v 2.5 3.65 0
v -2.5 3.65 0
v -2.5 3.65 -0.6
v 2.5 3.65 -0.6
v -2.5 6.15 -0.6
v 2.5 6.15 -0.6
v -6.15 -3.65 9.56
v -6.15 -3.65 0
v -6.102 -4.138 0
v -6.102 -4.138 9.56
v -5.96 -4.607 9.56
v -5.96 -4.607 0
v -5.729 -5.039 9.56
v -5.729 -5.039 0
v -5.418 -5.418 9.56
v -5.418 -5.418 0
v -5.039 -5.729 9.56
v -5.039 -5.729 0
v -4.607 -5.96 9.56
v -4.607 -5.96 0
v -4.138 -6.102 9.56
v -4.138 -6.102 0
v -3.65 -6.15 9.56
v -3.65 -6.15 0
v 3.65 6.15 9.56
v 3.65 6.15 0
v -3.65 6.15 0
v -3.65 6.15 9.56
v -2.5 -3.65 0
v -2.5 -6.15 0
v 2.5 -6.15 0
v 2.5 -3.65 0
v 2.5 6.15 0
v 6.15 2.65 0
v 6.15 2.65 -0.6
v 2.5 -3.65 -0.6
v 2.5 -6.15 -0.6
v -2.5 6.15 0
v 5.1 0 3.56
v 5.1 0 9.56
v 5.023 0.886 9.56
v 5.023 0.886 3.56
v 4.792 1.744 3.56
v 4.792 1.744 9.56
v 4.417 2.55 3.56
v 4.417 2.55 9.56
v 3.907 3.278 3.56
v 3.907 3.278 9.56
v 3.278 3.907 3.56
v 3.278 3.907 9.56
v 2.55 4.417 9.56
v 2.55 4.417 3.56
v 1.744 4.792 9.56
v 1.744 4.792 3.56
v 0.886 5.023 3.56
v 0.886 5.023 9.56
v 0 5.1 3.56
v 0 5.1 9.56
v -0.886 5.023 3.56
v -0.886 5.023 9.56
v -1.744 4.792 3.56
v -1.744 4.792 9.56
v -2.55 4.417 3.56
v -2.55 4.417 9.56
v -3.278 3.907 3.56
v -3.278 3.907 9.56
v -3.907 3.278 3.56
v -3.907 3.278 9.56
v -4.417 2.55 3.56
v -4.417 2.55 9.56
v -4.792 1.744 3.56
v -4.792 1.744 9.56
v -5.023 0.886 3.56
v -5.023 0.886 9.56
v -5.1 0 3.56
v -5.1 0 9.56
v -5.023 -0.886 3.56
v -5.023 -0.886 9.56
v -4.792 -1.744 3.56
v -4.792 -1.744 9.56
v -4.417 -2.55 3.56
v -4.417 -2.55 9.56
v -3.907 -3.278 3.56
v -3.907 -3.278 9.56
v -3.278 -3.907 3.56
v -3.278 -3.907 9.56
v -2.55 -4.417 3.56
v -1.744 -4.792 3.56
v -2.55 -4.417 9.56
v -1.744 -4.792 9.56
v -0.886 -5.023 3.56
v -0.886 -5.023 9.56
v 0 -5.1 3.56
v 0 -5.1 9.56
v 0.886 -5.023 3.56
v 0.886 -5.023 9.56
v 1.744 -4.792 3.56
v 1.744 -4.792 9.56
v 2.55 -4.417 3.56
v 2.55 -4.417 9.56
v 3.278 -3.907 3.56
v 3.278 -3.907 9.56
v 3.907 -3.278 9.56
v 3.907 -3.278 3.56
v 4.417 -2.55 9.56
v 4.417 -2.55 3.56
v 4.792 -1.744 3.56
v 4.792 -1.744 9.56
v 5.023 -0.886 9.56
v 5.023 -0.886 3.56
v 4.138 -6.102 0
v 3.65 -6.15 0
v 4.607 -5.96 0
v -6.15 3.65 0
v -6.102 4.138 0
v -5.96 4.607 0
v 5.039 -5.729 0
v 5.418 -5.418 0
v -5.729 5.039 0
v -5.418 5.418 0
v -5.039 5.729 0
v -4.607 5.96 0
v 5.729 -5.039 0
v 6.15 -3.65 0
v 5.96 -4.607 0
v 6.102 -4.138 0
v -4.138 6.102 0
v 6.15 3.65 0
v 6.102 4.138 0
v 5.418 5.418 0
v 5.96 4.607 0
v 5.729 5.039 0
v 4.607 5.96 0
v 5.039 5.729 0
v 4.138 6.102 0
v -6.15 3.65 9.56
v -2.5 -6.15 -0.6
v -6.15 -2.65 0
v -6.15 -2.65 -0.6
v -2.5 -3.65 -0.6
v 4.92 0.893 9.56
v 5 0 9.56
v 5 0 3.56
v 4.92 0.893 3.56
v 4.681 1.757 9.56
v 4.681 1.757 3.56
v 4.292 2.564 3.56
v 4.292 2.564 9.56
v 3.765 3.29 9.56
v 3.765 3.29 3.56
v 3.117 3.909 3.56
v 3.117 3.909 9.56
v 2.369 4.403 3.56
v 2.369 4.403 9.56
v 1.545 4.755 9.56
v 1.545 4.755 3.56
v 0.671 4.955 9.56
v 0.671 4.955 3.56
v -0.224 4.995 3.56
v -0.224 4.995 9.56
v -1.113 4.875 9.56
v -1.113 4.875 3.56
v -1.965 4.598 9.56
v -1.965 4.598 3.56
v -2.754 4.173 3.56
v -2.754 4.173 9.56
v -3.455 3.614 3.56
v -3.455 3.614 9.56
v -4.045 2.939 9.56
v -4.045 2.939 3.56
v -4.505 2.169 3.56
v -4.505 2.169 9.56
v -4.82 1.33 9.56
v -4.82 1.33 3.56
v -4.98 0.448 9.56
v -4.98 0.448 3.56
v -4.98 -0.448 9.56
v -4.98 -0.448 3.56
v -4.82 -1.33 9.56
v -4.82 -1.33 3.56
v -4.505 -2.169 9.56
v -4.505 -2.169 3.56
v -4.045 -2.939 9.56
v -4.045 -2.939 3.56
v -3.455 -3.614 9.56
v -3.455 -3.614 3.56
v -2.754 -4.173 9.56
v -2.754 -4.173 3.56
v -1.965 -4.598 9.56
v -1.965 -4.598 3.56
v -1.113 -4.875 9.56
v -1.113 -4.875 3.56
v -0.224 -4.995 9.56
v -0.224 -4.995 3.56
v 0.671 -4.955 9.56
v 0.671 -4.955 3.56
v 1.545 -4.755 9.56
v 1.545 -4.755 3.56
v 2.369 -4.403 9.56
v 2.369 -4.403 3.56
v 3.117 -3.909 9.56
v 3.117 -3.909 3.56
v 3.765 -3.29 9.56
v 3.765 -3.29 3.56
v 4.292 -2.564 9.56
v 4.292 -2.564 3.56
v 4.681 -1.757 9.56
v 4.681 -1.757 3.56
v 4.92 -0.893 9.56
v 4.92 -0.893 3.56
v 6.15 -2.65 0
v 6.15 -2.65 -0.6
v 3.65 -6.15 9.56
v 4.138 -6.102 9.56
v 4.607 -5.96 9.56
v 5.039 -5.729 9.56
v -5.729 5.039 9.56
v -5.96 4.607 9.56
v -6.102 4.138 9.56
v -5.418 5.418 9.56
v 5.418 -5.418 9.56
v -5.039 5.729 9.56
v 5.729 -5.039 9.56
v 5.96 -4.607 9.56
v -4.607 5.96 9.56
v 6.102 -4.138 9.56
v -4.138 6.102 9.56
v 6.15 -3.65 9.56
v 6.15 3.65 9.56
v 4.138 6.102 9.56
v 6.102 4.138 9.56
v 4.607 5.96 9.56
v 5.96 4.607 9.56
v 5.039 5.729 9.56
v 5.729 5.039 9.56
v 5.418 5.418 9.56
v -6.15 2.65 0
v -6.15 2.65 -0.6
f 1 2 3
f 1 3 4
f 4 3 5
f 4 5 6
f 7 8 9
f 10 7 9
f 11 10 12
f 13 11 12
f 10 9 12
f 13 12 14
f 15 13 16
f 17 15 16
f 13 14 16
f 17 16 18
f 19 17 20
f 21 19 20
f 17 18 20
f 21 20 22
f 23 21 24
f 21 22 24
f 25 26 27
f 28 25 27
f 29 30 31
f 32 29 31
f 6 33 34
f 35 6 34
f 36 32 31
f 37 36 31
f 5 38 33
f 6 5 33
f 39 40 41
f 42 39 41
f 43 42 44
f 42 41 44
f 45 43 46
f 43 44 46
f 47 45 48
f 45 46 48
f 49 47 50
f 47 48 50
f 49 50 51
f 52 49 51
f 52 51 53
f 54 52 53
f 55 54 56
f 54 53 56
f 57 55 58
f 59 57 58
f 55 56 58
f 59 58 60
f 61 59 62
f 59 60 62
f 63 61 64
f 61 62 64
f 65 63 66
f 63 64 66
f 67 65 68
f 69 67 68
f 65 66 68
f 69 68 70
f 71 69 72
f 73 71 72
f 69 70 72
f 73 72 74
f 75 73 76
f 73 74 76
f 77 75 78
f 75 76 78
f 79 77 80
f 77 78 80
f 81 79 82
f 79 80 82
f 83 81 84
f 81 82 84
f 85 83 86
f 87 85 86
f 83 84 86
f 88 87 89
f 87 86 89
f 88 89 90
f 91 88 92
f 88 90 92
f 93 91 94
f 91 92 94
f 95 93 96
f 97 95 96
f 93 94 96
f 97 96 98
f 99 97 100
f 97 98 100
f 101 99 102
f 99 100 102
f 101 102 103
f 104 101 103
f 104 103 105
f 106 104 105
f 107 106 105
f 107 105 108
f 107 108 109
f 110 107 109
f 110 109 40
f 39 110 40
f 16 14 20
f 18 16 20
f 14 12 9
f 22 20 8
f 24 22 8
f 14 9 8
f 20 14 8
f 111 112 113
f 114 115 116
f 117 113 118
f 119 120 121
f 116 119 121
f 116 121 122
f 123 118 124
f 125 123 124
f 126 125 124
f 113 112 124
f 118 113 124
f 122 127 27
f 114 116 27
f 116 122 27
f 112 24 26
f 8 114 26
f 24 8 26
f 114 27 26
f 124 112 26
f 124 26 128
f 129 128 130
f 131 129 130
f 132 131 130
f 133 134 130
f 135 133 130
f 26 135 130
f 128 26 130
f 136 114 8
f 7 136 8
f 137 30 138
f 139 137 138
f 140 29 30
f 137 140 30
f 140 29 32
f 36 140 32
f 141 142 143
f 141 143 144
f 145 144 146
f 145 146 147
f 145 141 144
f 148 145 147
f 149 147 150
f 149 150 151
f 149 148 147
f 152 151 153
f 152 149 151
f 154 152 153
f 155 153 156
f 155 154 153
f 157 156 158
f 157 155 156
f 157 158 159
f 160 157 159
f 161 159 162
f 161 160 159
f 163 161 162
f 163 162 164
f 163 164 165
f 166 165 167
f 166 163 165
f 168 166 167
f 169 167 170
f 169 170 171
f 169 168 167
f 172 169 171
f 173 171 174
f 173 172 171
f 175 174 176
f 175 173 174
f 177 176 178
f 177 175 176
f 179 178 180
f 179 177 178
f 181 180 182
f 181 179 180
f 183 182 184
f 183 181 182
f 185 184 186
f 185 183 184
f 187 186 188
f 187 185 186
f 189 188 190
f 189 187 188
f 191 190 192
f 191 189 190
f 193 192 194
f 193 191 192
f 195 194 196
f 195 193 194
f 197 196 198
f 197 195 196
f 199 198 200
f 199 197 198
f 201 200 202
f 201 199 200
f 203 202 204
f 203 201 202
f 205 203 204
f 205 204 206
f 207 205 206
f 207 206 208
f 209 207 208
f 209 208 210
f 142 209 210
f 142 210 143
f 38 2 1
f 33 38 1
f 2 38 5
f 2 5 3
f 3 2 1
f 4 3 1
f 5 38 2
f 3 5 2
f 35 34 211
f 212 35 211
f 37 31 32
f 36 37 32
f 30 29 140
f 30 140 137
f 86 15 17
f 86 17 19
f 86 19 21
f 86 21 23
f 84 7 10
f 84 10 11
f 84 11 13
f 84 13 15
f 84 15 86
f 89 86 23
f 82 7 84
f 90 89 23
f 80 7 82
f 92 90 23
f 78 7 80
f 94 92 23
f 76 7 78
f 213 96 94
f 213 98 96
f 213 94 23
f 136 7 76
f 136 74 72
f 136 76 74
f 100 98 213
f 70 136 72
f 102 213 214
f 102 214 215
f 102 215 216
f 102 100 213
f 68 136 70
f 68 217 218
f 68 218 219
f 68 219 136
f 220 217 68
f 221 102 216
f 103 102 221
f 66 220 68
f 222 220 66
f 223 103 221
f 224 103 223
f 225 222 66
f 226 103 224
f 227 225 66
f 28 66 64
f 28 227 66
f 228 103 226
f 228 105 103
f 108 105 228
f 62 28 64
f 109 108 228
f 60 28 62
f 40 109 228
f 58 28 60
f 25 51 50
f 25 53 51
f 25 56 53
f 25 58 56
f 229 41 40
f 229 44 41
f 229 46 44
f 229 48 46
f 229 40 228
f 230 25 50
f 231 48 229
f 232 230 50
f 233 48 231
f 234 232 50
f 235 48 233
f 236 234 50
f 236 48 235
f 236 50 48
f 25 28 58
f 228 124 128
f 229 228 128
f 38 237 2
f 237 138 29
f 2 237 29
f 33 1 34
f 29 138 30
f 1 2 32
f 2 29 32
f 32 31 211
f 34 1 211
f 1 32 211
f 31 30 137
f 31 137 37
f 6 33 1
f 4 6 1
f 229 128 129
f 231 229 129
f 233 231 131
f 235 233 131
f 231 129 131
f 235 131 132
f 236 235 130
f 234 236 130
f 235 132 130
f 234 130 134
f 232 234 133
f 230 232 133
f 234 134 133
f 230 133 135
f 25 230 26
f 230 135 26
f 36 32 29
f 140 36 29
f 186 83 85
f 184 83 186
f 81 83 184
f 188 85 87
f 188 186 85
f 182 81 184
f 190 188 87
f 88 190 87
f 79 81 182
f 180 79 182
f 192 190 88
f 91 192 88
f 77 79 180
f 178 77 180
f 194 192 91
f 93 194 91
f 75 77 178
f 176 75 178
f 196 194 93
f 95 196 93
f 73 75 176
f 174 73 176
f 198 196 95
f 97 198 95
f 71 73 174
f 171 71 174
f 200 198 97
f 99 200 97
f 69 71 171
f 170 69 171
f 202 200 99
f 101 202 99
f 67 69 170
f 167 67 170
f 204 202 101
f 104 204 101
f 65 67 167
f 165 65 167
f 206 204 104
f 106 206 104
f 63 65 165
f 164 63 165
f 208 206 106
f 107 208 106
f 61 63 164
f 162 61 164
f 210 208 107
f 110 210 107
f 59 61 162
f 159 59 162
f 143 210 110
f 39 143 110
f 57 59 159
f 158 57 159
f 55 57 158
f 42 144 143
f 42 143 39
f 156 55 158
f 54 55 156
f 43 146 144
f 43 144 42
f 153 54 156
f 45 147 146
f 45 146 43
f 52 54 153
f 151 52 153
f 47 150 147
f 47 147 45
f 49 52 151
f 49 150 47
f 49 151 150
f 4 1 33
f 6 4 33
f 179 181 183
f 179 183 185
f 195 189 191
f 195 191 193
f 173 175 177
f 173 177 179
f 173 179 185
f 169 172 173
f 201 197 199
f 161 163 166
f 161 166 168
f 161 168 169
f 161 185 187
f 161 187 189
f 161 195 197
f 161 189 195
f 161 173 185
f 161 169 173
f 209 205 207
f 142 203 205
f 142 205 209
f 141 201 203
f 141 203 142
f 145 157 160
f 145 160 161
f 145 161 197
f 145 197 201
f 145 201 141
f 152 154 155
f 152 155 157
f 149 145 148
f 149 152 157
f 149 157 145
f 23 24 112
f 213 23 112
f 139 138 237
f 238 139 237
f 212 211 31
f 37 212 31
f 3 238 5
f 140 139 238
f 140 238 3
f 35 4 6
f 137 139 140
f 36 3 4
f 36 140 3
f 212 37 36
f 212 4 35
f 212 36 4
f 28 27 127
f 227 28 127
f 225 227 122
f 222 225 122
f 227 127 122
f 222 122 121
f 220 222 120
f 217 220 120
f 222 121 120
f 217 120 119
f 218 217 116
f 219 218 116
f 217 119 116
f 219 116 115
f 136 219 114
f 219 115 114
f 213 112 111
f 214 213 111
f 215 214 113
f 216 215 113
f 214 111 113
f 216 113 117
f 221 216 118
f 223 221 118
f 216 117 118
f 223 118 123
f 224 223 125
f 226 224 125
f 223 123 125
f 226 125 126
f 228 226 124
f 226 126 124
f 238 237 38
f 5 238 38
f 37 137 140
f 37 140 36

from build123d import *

# Parameters (mm, degrees)
F1_DEPTH = 9.56
F2_R     = 3.995737
F3_DEPTH = 1
F4_R     = 5.1
F4_R_2   = 5
F5_DEPTH = 6
F7_DEPTH = 0.6
F8_W     = 5
F8_H     = 2.5
F9_DEPTH = 0.6


with BuildPart() as f1:
    # F0 (on Top) → F1 (new body)
    with BuildSketch(Plane.XY):
        with BuildLine():
            Line((-3.65, -6.15), (3.65, -6.15))
            ThreePointArc((3.65, -6.15), (5.417767, -5.417767), (6.15, -3.65))
            Line((6.15, -3.65), (6.15, 3.65))
            ThreePointArc((6.15, 3.65), (5.417767, 5.417767), (3.65, 6.15))
            Line((3.65, 6.15), (-3.65, 6.15))
            ThreePointArc((-3.65, 6.15), (-5.417767, 5.417767), (-6.15, 3.65))
            Line((-6.15, 3.65), (-6.15, -3.65))
            ThreePointArc((-6.15, -3.65), (-5.417767, -5.417767), (-3.65, -6.15))
        make_face()
    extrude(amount=F1_DEPTH)

    # F2 (on face) → F3 (join)
    with BuildSketch(Plane.XY.offset(9.56)):
        Circle(F2_R)
    extrude(amount=-F3_DEPTH)

    # F4 (on face) → F5 (cut)
    with BuildSketch(Plane.XY.offset(9.56)):
        Circle(F4_R)
        Circle(F4_R_2, mode=Mode.SUBTRACT)
    extrude(amount=-F5_DEPTH, mode=Mode.SUBTRACT)


with BuildPart() as f7:
    # F6 (on face) → F7 (new body)
    with BuildSketch(Plane(origin=(0, 0, 0), x_dir=(1, 0, 0), z_dir=(0, 0, -1))):
        Polygon((-6.15, 2.65), (-6.15, -2.65), (-2.5, -6.15), (-2.5, -3.65), (2.5, -3.65), (2.5, -6.15), (6.15, -2.65), (6.15, 2.65), (2.5, 6.15), (2.5, 3.65), (-2.5, 3.65), (-2.5, 6.15), align=None)
    extrude(amount=F7_DEPTH)


with BuildPart() as f9:
    # F8 (on face) → F9 (new body)
    with BuildSketch(Plane(origin=(0, 0, 0), x_dir=(1, 0, 0), z_dir=(0, 0, -1))):
        with Locations((0, -4.9)):
            Rectangle(F8_W, F8_H)
        with Locations((0, 4.9)):
            Rectangle(F8_W, F8_H)
    extrude(amount=F9_DEPTH)


solid = Compound([f1.part, f7.part, f9.part])
